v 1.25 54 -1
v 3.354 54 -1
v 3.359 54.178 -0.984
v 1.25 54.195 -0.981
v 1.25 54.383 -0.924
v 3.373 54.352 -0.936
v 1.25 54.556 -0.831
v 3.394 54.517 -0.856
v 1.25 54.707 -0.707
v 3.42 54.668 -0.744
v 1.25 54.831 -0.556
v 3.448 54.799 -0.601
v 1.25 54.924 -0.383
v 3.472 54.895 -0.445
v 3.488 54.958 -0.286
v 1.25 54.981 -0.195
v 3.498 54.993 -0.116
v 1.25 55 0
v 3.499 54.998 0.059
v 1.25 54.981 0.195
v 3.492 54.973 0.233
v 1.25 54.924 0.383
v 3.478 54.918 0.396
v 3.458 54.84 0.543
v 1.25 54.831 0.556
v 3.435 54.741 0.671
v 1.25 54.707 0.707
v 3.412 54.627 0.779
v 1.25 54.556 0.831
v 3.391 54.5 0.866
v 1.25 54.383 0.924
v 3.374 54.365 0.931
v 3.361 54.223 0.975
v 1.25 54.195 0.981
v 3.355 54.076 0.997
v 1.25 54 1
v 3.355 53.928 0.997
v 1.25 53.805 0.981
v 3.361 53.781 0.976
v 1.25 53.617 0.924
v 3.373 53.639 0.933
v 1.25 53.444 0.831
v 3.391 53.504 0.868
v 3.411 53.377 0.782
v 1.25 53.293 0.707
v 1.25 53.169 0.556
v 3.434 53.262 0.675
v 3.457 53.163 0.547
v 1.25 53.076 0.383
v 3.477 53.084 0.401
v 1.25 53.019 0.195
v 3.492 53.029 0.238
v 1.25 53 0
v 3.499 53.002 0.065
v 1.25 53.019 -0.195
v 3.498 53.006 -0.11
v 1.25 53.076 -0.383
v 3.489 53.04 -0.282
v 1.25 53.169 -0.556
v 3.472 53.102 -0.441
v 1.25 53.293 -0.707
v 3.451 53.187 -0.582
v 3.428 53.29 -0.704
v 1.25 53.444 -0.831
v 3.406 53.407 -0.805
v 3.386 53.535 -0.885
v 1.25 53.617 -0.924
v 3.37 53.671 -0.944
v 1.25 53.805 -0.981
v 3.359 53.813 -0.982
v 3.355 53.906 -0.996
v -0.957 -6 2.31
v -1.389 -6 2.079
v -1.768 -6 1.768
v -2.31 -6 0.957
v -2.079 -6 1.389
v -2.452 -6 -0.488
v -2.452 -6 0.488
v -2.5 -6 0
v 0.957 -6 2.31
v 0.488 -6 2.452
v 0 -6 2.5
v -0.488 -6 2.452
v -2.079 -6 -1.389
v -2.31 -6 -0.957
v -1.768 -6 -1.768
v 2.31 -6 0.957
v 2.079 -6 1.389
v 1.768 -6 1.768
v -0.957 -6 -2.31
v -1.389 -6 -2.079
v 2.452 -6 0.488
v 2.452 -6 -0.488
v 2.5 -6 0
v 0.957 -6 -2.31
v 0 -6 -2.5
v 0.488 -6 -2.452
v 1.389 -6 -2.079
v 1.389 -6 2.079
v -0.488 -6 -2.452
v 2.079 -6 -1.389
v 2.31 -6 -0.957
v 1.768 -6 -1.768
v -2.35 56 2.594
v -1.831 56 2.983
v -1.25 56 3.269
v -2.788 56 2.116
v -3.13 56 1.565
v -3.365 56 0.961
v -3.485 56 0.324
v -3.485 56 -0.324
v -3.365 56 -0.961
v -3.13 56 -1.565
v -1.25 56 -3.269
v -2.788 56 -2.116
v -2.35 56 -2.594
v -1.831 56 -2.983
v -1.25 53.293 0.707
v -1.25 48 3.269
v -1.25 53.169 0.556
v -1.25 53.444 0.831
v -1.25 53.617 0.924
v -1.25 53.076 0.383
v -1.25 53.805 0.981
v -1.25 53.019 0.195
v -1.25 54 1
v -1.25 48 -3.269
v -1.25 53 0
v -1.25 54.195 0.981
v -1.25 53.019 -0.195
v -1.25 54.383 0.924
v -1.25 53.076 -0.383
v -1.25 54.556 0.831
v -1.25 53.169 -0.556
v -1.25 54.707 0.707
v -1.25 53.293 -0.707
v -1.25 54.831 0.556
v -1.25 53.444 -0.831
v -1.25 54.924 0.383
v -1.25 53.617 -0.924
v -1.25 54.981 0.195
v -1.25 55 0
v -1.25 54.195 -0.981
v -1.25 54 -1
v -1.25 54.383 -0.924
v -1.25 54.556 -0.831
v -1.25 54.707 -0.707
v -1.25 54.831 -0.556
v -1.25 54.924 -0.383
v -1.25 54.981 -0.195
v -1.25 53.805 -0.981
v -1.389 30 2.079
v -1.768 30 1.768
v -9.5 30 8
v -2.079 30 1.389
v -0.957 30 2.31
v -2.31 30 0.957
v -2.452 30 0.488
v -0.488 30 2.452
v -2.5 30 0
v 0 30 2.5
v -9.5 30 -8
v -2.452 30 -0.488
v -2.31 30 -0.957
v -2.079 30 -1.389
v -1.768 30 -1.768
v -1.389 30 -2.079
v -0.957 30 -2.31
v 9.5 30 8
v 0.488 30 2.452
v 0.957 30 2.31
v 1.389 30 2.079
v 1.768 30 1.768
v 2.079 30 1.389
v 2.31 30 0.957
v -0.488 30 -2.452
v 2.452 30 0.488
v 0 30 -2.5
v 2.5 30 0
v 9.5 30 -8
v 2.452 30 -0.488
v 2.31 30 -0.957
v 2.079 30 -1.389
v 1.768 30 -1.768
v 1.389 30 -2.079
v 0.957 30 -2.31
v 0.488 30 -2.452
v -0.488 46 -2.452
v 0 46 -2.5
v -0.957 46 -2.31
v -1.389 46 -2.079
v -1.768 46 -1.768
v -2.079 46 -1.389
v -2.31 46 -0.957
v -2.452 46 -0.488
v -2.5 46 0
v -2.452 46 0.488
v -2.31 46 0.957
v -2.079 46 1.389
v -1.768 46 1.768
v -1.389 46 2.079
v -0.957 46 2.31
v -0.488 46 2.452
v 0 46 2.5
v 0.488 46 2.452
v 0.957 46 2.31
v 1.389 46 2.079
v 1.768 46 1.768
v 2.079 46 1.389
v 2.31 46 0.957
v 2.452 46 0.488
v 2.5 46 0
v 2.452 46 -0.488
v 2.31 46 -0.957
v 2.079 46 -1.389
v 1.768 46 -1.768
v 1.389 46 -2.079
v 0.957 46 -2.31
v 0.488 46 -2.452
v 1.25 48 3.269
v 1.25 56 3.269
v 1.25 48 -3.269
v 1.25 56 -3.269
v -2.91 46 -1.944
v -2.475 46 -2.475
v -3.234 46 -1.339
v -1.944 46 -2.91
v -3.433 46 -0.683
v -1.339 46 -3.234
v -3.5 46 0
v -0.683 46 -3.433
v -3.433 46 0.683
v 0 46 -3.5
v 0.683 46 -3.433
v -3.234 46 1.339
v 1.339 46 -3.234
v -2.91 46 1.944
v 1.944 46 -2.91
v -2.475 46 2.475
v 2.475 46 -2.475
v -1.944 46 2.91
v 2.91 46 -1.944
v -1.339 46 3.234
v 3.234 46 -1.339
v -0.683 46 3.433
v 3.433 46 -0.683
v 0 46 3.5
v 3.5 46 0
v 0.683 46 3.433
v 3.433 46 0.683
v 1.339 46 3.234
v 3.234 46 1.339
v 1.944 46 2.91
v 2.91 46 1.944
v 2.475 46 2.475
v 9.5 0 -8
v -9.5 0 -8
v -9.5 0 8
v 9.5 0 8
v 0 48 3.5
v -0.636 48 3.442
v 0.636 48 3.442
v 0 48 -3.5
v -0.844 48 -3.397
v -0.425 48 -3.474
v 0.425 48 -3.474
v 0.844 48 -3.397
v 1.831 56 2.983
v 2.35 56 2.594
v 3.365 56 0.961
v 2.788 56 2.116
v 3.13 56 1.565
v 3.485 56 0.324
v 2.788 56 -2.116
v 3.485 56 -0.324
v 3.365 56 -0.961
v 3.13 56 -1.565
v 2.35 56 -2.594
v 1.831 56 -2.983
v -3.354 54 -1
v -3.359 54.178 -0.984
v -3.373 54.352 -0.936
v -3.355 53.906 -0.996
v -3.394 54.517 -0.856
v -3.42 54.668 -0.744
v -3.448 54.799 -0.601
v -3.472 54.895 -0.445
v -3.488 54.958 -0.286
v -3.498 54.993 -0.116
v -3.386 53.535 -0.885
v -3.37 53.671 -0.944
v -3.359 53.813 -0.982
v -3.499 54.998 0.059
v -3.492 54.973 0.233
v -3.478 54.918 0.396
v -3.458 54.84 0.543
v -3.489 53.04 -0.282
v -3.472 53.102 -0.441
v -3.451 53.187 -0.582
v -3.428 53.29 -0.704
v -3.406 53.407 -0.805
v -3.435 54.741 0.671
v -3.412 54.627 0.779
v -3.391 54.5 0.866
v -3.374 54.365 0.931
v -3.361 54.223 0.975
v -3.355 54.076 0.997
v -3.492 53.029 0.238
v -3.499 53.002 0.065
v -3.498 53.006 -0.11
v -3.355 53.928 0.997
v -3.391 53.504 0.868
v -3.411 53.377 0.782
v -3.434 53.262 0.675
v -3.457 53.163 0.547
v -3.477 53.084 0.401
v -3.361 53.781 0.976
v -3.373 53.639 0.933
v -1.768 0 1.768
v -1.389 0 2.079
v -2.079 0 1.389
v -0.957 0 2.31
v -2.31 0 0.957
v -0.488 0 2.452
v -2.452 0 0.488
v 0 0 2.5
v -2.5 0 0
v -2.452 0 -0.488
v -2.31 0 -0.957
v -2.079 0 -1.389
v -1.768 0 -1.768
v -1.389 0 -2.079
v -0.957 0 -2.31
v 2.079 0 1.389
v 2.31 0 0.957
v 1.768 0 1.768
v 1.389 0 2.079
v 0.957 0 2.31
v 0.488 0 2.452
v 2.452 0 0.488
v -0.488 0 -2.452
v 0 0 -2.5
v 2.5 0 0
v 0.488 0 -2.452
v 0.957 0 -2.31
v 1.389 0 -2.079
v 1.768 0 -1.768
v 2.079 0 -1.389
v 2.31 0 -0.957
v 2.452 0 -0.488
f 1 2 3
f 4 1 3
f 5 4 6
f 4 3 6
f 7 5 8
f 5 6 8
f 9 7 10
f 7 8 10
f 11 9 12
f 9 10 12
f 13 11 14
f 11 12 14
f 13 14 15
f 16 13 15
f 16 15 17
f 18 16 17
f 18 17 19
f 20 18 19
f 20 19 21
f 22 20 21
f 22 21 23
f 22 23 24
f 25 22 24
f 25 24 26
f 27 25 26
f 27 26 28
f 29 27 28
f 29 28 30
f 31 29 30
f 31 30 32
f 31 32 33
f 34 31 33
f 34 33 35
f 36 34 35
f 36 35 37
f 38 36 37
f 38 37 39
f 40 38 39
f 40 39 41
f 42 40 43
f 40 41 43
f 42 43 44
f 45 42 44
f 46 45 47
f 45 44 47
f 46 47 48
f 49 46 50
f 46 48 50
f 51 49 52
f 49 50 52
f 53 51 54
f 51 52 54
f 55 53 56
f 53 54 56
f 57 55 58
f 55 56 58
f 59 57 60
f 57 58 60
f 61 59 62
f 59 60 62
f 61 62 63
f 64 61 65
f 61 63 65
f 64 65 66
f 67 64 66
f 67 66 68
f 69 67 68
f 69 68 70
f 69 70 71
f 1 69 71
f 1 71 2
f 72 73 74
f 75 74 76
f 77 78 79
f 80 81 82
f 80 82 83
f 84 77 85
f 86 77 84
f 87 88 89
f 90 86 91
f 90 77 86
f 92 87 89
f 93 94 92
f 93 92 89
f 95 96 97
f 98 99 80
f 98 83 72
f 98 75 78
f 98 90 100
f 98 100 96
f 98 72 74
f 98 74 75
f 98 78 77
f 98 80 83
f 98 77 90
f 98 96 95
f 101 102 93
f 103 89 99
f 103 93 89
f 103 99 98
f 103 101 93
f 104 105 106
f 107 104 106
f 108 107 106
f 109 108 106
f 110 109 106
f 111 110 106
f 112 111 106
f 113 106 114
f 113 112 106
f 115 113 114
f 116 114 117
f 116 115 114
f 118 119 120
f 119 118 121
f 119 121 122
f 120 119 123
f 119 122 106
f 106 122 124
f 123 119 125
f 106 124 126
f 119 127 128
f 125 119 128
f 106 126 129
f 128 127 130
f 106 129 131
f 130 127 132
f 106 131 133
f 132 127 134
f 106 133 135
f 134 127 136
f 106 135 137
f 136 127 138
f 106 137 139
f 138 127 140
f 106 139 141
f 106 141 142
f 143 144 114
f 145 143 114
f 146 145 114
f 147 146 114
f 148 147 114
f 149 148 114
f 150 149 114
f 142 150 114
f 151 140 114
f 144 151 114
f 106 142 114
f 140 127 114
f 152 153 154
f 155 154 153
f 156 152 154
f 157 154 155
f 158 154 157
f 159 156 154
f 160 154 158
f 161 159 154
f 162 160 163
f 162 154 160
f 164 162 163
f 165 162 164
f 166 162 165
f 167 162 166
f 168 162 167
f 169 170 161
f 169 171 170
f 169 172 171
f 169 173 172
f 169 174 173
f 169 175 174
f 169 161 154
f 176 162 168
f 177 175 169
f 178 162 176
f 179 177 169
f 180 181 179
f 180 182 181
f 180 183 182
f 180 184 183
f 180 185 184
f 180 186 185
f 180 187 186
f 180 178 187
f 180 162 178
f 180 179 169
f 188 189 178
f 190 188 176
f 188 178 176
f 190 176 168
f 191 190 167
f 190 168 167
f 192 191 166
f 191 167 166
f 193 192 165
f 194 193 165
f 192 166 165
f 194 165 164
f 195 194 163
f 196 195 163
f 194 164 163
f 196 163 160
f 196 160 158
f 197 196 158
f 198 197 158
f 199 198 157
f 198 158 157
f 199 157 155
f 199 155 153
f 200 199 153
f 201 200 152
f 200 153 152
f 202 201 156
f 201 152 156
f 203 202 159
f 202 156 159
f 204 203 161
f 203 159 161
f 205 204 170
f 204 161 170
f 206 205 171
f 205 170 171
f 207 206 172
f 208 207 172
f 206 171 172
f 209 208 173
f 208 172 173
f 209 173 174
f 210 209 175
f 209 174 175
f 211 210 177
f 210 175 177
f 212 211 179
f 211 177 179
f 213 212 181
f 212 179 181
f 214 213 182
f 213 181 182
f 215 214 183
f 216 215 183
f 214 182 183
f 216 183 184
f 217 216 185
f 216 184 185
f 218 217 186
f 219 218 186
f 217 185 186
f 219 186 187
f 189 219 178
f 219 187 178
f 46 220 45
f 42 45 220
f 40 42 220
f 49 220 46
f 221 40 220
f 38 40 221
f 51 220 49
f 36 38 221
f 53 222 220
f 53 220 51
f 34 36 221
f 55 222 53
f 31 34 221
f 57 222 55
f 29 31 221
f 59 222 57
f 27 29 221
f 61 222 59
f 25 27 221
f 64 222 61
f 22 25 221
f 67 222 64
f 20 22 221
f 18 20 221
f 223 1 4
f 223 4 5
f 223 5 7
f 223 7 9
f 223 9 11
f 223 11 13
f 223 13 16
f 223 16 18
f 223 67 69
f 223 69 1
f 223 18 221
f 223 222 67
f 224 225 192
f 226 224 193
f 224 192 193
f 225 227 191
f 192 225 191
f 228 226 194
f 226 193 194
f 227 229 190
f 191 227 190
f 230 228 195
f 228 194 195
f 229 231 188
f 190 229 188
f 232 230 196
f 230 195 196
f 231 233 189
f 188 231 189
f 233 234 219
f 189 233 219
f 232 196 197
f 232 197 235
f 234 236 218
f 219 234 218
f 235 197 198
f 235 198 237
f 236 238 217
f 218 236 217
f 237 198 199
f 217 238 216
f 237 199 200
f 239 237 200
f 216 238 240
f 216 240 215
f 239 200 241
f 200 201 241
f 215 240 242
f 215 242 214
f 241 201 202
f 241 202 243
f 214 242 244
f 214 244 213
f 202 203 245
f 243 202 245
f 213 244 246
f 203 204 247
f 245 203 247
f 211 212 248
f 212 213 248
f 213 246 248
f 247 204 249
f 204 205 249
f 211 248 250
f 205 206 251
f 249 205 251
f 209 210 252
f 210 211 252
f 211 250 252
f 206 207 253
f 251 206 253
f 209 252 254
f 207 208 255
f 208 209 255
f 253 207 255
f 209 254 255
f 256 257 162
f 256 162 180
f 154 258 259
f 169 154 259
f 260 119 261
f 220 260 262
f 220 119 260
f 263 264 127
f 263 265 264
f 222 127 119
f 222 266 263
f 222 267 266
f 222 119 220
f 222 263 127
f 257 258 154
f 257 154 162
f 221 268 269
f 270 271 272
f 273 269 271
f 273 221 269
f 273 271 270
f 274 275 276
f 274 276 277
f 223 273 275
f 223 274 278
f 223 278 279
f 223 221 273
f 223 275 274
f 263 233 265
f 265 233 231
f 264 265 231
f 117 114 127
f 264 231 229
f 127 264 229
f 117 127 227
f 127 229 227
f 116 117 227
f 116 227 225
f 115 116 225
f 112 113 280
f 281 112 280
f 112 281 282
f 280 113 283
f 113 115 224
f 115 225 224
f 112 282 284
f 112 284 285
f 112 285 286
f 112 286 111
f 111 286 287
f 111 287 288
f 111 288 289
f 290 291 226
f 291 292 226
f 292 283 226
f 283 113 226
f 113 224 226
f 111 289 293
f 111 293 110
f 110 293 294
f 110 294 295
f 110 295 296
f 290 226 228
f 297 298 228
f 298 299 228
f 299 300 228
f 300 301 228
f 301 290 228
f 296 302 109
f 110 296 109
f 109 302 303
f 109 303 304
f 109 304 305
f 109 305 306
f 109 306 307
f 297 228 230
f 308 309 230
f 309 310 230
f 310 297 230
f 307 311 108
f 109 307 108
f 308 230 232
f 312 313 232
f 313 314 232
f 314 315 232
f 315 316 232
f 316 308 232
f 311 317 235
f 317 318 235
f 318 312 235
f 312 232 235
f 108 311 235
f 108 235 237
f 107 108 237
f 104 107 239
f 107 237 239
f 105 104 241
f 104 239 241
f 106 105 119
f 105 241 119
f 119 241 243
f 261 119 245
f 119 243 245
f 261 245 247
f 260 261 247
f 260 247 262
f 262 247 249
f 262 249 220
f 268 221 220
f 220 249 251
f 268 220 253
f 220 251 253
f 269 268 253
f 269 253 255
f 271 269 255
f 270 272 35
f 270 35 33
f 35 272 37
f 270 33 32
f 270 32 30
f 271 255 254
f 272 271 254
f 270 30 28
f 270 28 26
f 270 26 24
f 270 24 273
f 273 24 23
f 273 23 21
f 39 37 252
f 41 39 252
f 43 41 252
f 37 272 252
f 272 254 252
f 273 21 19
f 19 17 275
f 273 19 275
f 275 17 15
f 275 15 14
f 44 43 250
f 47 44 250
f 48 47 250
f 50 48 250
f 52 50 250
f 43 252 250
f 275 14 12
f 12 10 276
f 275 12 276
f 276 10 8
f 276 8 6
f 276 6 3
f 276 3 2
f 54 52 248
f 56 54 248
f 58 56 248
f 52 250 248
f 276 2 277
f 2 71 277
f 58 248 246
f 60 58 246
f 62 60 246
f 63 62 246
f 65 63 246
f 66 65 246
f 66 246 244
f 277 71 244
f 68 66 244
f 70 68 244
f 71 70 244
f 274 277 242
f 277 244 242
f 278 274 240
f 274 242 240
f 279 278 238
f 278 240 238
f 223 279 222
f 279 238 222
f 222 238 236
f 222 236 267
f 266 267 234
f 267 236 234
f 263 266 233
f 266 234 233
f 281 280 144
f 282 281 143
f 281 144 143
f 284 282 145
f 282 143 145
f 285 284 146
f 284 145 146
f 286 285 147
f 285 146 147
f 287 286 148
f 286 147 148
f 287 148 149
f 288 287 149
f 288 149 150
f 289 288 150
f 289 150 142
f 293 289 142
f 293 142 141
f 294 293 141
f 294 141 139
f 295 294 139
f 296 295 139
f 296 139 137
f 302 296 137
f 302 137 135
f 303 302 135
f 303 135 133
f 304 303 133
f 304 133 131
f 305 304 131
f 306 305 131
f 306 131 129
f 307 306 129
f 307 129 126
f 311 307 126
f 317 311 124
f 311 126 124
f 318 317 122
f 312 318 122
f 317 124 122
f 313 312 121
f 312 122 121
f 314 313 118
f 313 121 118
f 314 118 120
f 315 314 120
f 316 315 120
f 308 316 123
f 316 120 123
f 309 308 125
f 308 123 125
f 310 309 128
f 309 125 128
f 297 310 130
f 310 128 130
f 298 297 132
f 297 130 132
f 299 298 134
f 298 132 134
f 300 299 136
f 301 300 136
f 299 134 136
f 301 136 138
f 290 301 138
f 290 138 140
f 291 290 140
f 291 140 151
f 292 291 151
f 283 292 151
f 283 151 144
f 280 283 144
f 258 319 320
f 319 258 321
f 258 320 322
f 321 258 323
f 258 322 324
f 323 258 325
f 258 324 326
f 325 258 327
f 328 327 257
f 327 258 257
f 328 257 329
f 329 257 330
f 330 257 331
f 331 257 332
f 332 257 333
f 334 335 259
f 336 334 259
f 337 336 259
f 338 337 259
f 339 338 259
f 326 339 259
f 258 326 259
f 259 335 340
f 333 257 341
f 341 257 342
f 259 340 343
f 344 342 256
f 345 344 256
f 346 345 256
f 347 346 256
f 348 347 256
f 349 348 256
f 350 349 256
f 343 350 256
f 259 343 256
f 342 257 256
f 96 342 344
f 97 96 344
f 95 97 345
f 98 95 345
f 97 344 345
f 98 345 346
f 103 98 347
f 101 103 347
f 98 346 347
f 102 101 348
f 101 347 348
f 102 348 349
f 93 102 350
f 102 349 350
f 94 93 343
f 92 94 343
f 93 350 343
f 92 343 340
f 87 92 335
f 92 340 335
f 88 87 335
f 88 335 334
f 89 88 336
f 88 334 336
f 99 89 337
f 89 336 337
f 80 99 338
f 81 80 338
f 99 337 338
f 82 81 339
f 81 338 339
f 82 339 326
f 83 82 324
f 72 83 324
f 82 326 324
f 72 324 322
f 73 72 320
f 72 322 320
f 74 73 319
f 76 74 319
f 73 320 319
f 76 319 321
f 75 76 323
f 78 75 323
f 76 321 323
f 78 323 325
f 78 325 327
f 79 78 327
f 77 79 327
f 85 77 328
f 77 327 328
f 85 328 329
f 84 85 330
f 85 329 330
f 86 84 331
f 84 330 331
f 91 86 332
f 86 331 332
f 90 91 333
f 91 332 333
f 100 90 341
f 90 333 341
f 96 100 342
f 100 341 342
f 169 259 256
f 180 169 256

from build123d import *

# Parameters (mm, degrees)
SKETCH1_W               = 19
SKETCH1_H               = 16
BOSS_EXTRUDE1_DEPTH     = 30
SKETCH2_R               = 3.5
BOSS_EXTRUDE2_DEPTH     = 26
SKETCH3_R               = 2.5
BOSS_EXTRUDE3_DEPTH     = 6
SKETCH4_R               = 1
CUT_EXTRUDE2_DEPTH      = 60.674114991
SKETCH5_R               = 3.5
SKETCH5_R_2             = 2.5
CUT_EXTRUDE3_DEPTH      = 16
CUT_EXTRUDE4_DEPTH      = 58.36070093
CUT_EXTRUDE4_DEPTH_BACK = 58.36070093
SKETCH6_W               = 2.5
SKETCH6_H               = 8


with BuildPart() as part:
    # Sketch1 → Boss-Extrude1 (new body)
    with BuildSketch(Plane(origin=(0, 0, 0), x_dir=(1, 0, 0), z_dir=(0, 1, 0))):
        Rectangle(SKETCH1_W, SKETCH1_H)
    extrude(amount=BOSS_EXTRUDE1_DEPTH)

    # Sketch2 → Boss-Extrude2 (add)
    with BuildSketch(Plane(origin=(0, 30, 0), x_dir=(1, 0, 0), z_dir=(0, 1, 0))):
        with Locations(Location((0, 0, 0), (0, 0, 90))):
            Circle(SKETCH2_R)
    extrude(amount=BOSS_EXTRUDE2_DEPTH)

    # Sketch3 → Boss-Extrude3 (add)
    with BuildSketch(Plane.XZ):
        with Locations(Location((0, 0, 0), (0, 0, 270))):
            Circle(SKETCH3_R)
    extrude(amount=BOSS_EXTRUDE3_DEPTH)

    # Sketch4 → Cut-Extrude2 (cut, through all)
    with BuildSketch(Plane(origin=(9.5, 0, 0), x_dir=(0, 0, -1), z_dir=(1, 0, 0))):
        with Locations((0, 54)):
            Circle(SKETCH4_R)
    extrude(amount=-CUT_EXTRUDE2_DEPTH, mode=Mode.SUBTRACT)

    # Sketch5 → Cut-Extrude3 (cut)
    with BuildSketch(Plane(origin=(0, 30, 0), x_dir=(1, 0, 0), z_dir=(0, 1, 0))):
        with Locations(Location((0, 0, 0), (0, 0, 270))):
            Circle(SKETCH5_R)
        with Locations(Location((0, 0, 0), (0, 0, 90))):
            Circle(SKETCH5_R_2, mode=Mode.SUBTRACT)
    extrude(amount=CUT_EXTRUDE3_DEPTH, mode=Mode.SUBTRACT)

    # Sketch6 → Cut-Extrude4 (cut, two sides: drawn at the far end of the back side and taken through both)
    with BuildSketch(Plane.XY.offset(-CUT_EXTRUDE4_DEPTH_BACK)):
        with Locations((0, 52)):
            Rectangle(SKETCH6_W, SKETCH6_H)
    extrude(amount=CUT_EXTRUDE4_DEPTH + CUT_EXTRUDE4_DEPTH_BACK, mode=Mode.SUBTRACT)


solid = part.part
